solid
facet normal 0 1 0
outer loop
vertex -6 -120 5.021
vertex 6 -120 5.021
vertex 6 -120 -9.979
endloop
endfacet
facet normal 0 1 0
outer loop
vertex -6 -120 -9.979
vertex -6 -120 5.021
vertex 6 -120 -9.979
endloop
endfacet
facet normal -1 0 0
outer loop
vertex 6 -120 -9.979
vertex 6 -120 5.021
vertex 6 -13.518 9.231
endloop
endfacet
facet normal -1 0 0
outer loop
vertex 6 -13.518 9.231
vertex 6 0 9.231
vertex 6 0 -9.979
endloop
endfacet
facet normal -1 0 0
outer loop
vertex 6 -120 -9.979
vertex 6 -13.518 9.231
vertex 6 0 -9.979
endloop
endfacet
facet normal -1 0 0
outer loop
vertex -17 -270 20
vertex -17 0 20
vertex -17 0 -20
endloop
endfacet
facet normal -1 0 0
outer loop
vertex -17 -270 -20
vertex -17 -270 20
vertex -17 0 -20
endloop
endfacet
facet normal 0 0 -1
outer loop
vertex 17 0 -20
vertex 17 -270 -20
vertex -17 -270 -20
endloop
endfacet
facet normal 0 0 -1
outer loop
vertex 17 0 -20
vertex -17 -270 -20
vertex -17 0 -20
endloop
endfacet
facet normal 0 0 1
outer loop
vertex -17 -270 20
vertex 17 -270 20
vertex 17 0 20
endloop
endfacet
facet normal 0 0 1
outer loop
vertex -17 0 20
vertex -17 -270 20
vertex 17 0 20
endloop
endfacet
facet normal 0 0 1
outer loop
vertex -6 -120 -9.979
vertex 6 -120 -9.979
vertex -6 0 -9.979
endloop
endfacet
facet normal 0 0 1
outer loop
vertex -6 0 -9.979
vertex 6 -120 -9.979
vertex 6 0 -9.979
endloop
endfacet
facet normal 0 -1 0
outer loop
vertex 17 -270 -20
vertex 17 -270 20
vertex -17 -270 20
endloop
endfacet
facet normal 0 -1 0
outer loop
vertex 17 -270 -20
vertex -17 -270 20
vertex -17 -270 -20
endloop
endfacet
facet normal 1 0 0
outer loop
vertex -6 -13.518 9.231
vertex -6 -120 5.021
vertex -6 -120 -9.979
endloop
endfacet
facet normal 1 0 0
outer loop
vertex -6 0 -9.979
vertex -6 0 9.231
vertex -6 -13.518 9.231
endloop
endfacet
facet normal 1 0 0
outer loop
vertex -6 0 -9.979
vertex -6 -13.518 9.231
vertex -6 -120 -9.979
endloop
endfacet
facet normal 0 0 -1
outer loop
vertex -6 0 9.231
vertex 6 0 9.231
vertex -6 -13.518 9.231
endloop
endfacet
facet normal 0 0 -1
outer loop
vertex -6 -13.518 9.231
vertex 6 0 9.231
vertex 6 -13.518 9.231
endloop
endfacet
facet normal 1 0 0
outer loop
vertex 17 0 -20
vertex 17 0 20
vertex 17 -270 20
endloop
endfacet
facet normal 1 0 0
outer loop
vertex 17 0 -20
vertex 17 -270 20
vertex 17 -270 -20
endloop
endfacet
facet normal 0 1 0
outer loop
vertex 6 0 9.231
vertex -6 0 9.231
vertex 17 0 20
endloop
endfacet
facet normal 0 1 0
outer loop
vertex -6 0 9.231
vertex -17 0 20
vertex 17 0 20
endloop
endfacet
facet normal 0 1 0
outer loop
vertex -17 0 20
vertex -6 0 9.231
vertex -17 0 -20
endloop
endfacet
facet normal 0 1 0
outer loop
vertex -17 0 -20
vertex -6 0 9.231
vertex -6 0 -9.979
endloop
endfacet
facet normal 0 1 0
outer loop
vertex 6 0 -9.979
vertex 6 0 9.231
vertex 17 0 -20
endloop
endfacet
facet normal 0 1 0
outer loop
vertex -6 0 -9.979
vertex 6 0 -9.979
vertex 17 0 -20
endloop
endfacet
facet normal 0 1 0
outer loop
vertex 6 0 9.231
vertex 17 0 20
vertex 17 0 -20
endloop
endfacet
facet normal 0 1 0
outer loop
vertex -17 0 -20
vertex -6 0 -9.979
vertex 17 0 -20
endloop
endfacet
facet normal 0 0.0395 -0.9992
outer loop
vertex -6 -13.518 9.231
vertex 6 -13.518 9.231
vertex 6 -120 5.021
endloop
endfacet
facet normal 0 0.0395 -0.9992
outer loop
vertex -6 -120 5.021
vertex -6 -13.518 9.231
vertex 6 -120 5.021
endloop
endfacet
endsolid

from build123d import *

# Parameters (mm, degrees)
SKETCH_1_W          = 40
SKETCH_1_H          = 270
EXTRUDE_1_DEPTH     = 17
CUT_EXTRUDE_1_DEPTH = 6


with BuildPart() as part:
    # 스케치1 → 보스-돌출1 (new, symmetric)
    with BuildSketch(Plane(origin=(0, 0, 0), x_dir=(0, 0, -1), z_dir=(1, 0, 0))):
        with Locations((0, -135)):
            Rectangle(SKETCH_1_W, SKETCH_1_H)
    extrude(amount=EXTRUDE_1_DEPTH, both=True)

    # 스케치2 → 컷-돌출1 (cut, symmetric)
    with BuildSketch(Plane(origin=(0, 0, 0), x_dir=(0, 0, -1), z_dir=(1, 0, 0))):
        Polygon((-9.231313733, 0), (-9.231313733, -13.51839175), (-5.020847881, -120), (9.979152119, -120), (9.979152119, 0), align=None)
    extrude(amount=CUT_EXTRUDE_1_DEPTH, both=True, mode=Mode.SUBTRACT)


solid = part.part
